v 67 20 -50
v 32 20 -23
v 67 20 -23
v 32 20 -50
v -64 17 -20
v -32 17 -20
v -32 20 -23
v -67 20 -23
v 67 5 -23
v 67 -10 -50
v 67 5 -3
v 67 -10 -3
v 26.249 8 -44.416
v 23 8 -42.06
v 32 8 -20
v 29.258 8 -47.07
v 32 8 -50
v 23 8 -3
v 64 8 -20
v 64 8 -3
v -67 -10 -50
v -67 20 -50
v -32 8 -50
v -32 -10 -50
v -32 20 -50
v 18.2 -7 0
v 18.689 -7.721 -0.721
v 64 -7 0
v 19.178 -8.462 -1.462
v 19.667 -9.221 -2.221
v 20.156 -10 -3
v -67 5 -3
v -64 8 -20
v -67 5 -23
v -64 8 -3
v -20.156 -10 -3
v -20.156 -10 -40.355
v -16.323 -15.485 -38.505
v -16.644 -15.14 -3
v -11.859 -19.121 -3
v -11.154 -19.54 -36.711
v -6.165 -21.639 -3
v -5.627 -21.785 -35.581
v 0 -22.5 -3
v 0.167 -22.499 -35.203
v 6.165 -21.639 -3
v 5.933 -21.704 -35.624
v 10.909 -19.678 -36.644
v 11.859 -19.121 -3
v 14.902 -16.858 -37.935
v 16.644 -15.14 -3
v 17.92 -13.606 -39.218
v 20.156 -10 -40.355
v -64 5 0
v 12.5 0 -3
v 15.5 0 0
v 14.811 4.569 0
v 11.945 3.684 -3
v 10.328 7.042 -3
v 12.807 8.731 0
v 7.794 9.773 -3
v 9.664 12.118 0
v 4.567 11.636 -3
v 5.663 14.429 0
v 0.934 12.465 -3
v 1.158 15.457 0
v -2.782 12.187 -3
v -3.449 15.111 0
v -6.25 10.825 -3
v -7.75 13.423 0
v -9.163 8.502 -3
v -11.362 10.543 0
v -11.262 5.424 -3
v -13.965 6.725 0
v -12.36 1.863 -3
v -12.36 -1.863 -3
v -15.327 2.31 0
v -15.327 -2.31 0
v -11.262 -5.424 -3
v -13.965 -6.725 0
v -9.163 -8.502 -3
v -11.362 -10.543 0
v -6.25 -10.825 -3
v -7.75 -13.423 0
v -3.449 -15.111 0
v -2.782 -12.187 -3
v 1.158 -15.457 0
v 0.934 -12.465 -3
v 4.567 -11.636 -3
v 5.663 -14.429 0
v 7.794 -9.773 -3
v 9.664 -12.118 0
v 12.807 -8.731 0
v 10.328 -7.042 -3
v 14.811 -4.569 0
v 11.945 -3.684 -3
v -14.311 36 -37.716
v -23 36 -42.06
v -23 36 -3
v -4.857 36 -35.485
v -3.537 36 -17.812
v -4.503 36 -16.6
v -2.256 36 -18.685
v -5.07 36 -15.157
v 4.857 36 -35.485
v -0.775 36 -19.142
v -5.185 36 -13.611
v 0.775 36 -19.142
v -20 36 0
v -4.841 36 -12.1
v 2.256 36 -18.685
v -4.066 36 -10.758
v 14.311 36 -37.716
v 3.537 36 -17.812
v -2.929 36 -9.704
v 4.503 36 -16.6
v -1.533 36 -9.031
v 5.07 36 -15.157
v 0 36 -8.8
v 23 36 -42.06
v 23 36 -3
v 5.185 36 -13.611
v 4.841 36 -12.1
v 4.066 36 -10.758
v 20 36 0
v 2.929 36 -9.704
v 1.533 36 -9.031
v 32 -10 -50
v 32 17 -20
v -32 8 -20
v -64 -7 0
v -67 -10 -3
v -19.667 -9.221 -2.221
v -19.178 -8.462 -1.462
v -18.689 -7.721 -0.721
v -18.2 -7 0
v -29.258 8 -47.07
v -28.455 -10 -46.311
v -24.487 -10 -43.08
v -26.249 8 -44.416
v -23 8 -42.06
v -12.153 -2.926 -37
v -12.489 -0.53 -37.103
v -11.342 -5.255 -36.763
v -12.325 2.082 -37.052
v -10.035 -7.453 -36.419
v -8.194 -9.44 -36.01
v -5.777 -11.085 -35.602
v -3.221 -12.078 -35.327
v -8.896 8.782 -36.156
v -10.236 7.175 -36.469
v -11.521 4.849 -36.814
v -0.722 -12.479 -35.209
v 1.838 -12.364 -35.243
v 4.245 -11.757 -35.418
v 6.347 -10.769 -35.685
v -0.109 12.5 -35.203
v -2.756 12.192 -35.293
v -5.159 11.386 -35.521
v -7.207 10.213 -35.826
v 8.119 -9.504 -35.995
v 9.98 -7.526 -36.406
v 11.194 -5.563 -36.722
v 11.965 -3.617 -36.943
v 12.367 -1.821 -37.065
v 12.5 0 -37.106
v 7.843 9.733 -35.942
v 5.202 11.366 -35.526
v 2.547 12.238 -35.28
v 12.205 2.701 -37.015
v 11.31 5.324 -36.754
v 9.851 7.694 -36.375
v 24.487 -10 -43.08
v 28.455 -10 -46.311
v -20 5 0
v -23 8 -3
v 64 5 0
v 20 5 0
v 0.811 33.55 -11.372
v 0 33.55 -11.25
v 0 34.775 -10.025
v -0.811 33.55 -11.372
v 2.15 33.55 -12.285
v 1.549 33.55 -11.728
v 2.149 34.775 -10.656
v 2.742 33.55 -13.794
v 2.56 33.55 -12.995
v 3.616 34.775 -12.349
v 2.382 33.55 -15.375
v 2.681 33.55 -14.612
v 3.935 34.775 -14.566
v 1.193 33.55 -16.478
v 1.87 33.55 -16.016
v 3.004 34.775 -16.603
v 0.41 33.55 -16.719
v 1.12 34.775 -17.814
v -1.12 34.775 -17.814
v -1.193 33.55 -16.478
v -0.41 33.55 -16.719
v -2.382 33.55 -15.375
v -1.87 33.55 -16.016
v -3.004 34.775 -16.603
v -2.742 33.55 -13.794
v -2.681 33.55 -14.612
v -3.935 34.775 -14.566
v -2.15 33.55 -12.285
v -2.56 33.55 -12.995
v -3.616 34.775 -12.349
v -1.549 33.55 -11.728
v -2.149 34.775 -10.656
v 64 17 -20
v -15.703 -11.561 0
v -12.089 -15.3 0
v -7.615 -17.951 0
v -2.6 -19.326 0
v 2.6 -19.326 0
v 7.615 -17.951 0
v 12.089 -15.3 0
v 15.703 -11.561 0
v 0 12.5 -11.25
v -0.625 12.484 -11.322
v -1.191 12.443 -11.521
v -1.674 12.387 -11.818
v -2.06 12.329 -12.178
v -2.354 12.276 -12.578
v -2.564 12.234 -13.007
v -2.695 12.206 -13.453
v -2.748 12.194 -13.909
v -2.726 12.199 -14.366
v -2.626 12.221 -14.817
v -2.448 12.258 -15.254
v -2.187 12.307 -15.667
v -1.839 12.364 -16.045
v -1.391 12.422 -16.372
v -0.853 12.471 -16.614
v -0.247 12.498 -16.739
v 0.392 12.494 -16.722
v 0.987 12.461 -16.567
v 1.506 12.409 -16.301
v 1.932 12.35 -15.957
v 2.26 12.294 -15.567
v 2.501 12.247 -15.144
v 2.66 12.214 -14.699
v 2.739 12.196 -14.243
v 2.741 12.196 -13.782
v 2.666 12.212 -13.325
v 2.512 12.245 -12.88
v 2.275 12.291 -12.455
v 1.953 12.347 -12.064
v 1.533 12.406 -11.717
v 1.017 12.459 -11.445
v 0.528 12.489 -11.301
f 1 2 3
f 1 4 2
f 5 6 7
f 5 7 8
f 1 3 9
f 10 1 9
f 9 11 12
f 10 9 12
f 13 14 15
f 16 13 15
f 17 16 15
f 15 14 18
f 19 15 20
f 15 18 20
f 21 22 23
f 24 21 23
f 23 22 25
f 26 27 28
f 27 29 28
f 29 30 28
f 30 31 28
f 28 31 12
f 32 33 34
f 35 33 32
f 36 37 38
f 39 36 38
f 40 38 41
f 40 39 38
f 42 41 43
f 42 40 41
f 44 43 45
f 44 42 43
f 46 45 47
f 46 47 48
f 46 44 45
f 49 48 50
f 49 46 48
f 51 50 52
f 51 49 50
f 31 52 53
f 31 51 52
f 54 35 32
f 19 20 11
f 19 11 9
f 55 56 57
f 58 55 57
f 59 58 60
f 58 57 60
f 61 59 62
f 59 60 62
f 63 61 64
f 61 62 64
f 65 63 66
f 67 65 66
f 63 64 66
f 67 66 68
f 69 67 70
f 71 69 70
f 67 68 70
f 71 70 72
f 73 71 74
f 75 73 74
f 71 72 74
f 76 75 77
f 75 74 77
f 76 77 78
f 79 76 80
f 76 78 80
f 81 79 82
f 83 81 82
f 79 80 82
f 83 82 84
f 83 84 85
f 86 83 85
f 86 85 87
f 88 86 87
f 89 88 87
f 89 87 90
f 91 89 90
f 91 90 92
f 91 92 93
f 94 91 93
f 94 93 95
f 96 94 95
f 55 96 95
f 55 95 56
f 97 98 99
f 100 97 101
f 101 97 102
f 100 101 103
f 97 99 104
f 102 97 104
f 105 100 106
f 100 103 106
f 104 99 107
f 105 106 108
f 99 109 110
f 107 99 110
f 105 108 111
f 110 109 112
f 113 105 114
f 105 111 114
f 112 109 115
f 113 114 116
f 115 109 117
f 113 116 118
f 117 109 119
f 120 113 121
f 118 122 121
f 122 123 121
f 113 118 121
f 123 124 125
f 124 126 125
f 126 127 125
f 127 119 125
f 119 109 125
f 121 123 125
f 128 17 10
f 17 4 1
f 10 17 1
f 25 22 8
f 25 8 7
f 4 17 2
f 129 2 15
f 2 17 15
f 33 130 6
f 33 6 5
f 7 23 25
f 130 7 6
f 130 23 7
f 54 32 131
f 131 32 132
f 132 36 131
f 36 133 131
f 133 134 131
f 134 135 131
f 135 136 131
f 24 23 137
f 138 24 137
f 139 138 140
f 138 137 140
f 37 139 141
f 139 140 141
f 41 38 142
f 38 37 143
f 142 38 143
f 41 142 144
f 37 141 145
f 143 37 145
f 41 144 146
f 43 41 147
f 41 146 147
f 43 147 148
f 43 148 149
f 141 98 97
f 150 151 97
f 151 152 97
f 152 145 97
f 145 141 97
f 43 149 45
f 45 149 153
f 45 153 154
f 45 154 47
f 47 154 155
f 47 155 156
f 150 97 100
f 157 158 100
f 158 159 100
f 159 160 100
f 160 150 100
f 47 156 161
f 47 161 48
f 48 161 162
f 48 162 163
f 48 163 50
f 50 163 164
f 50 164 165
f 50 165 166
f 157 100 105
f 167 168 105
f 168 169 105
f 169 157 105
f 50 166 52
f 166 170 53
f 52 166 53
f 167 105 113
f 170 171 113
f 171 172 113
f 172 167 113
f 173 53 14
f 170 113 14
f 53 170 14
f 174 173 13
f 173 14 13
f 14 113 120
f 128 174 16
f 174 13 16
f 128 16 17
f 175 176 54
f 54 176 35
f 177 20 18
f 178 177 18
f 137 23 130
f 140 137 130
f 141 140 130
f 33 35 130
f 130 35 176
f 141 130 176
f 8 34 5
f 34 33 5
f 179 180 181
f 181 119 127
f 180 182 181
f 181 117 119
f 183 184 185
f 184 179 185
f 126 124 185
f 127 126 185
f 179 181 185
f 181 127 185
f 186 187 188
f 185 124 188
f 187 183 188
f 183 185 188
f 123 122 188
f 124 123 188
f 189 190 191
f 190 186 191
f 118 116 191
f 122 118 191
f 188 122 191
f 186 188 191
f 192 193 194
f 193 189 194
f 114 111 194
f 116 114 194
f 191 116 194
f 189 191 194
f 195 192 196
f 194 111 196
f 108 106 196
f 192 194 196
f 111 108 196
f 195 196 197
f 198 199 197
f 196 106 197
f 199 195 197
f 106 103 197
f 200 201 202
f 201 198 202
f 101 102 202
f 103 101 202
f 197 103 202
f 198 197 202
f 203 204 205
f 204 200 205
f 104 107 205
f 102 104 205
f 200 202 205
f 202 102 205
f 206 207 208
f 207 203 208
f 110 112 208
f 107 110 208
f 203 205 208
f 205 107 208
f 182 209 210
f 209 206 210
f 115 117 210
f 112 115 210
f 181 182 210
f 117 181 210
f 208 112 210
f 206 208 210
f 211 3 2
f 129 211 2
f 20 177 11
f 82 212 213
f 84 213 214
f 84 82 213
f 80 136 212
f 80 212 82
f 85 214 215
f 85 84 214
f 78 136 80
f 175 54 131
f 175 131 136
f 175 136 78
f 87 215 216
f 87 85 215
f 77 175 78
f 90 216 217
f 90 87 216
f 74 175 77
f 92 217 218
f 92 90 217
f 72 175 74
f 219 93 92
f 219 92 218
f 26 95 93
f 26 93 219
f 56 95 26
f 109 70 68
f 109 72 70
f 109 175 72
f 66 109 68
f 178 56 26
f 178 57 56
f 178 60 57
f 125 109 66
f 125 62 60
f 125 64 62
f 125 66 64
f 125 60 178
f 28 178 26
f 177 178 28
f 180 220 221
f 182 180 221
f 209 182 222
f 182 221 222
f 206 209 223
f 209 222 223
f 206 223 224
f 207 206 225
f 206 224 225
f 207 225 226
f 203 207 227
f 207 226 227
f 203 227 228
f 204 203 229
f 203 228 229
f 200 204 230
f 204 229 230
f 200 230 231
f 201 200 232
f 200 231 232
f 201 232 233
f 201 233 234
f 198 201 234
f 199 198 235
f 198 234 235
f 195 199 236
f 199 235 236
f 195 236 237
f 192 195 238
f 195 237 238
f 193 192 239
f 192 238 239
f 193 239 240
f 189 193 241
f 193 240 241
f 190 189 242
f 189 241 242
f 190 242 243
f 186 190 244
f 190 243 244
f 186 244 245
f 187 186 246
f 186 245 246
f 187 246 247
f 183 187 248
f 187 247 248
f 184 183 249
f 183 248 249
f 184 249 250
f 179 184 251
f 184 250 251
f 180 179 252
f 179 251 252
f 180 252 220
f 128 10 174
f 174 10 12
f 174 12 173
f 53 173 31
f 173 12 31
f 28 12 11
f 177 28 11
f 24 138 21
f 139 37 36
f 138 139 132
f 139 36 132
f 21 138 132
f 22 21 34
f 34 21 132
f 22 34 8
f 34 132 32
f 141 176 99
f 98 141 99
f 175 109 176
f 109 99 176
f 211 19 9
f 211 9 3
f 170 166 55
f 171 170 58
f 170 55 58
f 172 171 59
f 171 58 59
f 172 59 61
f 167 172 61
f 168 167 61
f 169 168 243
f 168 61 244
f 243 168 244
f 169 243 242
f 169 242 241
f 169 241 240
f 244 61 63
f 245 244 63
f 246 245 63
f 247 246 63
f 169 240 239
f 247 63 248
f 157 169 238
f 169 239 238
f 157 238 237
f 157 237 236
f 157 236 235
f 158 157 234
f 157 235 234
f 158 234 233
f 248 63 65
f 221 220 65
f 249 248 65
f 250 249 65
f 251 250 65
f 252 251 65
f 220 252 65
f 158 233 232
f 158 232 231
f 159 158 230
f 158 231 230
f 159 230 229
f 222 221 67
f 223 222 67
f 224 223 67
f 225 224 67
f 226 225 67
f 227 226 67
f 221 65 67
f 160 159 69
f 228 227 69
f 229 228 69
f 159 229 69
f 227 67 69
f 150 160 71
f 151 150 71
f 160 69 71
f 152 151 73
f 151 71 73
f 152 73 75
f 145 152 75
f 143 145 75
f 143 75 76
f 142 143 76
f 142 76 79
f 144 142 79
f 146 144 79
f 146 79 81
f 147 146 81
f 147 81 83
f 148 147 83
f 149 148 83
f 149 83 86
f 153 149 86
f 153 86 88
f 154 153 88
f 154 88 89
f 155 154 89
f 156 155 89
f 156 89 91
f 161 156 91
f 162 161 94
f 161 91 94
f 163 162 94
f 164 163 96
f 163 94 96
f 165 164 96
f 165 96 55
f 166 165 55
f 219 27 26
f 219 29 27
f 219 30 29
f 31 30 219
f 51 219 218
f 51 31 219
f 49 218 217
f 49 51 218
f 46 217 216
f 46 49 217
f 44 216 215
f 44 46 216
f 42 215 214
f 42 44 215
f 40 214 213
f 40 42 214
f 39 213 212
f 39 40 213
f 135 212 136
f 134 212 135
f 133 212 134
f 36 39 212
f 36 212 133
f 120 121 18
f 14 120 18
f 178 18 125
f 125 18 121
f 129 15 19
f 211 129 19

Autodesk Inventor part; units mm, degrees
ref_plane "YZ Plane" through (0, 0, 0) normal (1, 0, 0) x (0, 1, 0)
ref_plane "XZ Plane" through (0, 0, 0) normal (0, 1, 0) x (-1, 0, 0)
ref_plane "XY Plane" through (0, 0, 0) normal (0, 0, 1) x (1, 0, 0)
sketch "Szkic1" plane through (0, 0, 0) normal (0, 0, 1) x (1, 0, 0)
  arc A0 (-20.1556, -10) -> (20.1556, -10) centre (0, 0) ccw
  line L0 (-20.1556, -10) -> (-67, -10)
  line L1 (-67, -10) -> (-67, 8)
  line L2 (-67, 8) -> (-23, 8)
  line L3 (-23, 8) -> (-23, 36)
  line L4 (-23, 36) -> (23, 36)
  line L5 (23, 36) -> (23, 8)
  line L6 (23, 8) -> (67, 8)
  line L7 (67, 8) -> (67, -10)
  line L8 (67, -10) -> (20.1556, -10)
  point P0 (0, -22.5)
  dimension "d0" = 45
  dimension "d1" = 10
  dimension "d2" = 18
  dimension "d3" = 46
  dimension "d4" = 44
  dimension "d5" = 44
  dimension "d6" = 23
  dimension "d7" = 58.5
extrude "Wyciągnięcie proste1" add sketch "Szkic1" against normal blind 50
sketch "Szkic2" plane through (0, 0, 0) normal (0, 0, 1) x (1, 0, 0)
  circle A0 centre (0, 0) radius 12.5
  dimension "d10" = 25
extrude "Wyciągnięcie proste2" cut sketch "Szkic2" against normal blind 50
sketch "Szkic3" plane through (23, 8, 0) normal (0, 1, 0) x (1, 0, 0)
  line L0 (0, 50) -> (44, 50) projected
  line L1 (44, 50) -> (9, 50)
  line L2 (9, 50) -> (9, 20)
  line L3 (9, 20) -> (44, 20)
  line L4 (44, 20) -> (44, 50)
  line L5 (-90, 50) -> (-46, 50) projected
  line L6 (-90, 50) -> (-55, 50)
  line L7 (-55, 50) -> (-55, 20)
  line L8 (-55, 20) -> (-90, 20)
  line L9 (-90, 20) -> (-90, 50)
  point P0 (-23, 0)
  point P1 (9, 50)
  dimension "d13" = 35
  dimension "d14" = 30
  dimension "d15" = 35
  dimension "d16" = 30
extrude "Wyciągnięcie proste3" add sketch "Szkic3" along normal blind 12
sketch "Szkic4" plane through (-23, 36, 0) normal (0, 1, 0) x (1, 0, 0)
  circle A0 centre (23, 77.2029) radius 42
  point P0 (23, 0)
  point P1 (-9, 50)
  point P2 (55, 50)
  dimension "d19" = 84
extrude "Wyciągnięcie proste4" cut sketch "Szkic4" against normal blind 141.25
chamfer "Faza1" distance 3 angle 45 16 edges at (-45, 8, 0) (-23, 22, 0) (-67, 8, -10) (-67, 14, -20) (-49.5, 20, -20) (-67, -1, 0) (-43.5778, -10, 0) (0, -22.5, 0) (43.5778, -10, 0) (67, -1, 0) (45, 8, 0) (23, 22, 0) (67, 8, -10) (67, 14, -20) (49.5, 20, -20) (-12.5, 0, 0)
sketch "Szkic5" plane through (0, 36, -77.2029) normal (0, 1, 0) x (1, 0, 0)
  point P0 (0, -77.2029)
  point P1 (0, -63.2029)
  point P2 (161.096, 29.7407)
  dimension "d25" = 14
hole "Otwór1" at (161.096, 36, -106.9437) at (0, 36, -14) direction (0, -1, 0) diameter 5.5 depth 23.81 tip angle 118 countersink diameter 10.4 countersink angle 90
properties part number "zad 8"
